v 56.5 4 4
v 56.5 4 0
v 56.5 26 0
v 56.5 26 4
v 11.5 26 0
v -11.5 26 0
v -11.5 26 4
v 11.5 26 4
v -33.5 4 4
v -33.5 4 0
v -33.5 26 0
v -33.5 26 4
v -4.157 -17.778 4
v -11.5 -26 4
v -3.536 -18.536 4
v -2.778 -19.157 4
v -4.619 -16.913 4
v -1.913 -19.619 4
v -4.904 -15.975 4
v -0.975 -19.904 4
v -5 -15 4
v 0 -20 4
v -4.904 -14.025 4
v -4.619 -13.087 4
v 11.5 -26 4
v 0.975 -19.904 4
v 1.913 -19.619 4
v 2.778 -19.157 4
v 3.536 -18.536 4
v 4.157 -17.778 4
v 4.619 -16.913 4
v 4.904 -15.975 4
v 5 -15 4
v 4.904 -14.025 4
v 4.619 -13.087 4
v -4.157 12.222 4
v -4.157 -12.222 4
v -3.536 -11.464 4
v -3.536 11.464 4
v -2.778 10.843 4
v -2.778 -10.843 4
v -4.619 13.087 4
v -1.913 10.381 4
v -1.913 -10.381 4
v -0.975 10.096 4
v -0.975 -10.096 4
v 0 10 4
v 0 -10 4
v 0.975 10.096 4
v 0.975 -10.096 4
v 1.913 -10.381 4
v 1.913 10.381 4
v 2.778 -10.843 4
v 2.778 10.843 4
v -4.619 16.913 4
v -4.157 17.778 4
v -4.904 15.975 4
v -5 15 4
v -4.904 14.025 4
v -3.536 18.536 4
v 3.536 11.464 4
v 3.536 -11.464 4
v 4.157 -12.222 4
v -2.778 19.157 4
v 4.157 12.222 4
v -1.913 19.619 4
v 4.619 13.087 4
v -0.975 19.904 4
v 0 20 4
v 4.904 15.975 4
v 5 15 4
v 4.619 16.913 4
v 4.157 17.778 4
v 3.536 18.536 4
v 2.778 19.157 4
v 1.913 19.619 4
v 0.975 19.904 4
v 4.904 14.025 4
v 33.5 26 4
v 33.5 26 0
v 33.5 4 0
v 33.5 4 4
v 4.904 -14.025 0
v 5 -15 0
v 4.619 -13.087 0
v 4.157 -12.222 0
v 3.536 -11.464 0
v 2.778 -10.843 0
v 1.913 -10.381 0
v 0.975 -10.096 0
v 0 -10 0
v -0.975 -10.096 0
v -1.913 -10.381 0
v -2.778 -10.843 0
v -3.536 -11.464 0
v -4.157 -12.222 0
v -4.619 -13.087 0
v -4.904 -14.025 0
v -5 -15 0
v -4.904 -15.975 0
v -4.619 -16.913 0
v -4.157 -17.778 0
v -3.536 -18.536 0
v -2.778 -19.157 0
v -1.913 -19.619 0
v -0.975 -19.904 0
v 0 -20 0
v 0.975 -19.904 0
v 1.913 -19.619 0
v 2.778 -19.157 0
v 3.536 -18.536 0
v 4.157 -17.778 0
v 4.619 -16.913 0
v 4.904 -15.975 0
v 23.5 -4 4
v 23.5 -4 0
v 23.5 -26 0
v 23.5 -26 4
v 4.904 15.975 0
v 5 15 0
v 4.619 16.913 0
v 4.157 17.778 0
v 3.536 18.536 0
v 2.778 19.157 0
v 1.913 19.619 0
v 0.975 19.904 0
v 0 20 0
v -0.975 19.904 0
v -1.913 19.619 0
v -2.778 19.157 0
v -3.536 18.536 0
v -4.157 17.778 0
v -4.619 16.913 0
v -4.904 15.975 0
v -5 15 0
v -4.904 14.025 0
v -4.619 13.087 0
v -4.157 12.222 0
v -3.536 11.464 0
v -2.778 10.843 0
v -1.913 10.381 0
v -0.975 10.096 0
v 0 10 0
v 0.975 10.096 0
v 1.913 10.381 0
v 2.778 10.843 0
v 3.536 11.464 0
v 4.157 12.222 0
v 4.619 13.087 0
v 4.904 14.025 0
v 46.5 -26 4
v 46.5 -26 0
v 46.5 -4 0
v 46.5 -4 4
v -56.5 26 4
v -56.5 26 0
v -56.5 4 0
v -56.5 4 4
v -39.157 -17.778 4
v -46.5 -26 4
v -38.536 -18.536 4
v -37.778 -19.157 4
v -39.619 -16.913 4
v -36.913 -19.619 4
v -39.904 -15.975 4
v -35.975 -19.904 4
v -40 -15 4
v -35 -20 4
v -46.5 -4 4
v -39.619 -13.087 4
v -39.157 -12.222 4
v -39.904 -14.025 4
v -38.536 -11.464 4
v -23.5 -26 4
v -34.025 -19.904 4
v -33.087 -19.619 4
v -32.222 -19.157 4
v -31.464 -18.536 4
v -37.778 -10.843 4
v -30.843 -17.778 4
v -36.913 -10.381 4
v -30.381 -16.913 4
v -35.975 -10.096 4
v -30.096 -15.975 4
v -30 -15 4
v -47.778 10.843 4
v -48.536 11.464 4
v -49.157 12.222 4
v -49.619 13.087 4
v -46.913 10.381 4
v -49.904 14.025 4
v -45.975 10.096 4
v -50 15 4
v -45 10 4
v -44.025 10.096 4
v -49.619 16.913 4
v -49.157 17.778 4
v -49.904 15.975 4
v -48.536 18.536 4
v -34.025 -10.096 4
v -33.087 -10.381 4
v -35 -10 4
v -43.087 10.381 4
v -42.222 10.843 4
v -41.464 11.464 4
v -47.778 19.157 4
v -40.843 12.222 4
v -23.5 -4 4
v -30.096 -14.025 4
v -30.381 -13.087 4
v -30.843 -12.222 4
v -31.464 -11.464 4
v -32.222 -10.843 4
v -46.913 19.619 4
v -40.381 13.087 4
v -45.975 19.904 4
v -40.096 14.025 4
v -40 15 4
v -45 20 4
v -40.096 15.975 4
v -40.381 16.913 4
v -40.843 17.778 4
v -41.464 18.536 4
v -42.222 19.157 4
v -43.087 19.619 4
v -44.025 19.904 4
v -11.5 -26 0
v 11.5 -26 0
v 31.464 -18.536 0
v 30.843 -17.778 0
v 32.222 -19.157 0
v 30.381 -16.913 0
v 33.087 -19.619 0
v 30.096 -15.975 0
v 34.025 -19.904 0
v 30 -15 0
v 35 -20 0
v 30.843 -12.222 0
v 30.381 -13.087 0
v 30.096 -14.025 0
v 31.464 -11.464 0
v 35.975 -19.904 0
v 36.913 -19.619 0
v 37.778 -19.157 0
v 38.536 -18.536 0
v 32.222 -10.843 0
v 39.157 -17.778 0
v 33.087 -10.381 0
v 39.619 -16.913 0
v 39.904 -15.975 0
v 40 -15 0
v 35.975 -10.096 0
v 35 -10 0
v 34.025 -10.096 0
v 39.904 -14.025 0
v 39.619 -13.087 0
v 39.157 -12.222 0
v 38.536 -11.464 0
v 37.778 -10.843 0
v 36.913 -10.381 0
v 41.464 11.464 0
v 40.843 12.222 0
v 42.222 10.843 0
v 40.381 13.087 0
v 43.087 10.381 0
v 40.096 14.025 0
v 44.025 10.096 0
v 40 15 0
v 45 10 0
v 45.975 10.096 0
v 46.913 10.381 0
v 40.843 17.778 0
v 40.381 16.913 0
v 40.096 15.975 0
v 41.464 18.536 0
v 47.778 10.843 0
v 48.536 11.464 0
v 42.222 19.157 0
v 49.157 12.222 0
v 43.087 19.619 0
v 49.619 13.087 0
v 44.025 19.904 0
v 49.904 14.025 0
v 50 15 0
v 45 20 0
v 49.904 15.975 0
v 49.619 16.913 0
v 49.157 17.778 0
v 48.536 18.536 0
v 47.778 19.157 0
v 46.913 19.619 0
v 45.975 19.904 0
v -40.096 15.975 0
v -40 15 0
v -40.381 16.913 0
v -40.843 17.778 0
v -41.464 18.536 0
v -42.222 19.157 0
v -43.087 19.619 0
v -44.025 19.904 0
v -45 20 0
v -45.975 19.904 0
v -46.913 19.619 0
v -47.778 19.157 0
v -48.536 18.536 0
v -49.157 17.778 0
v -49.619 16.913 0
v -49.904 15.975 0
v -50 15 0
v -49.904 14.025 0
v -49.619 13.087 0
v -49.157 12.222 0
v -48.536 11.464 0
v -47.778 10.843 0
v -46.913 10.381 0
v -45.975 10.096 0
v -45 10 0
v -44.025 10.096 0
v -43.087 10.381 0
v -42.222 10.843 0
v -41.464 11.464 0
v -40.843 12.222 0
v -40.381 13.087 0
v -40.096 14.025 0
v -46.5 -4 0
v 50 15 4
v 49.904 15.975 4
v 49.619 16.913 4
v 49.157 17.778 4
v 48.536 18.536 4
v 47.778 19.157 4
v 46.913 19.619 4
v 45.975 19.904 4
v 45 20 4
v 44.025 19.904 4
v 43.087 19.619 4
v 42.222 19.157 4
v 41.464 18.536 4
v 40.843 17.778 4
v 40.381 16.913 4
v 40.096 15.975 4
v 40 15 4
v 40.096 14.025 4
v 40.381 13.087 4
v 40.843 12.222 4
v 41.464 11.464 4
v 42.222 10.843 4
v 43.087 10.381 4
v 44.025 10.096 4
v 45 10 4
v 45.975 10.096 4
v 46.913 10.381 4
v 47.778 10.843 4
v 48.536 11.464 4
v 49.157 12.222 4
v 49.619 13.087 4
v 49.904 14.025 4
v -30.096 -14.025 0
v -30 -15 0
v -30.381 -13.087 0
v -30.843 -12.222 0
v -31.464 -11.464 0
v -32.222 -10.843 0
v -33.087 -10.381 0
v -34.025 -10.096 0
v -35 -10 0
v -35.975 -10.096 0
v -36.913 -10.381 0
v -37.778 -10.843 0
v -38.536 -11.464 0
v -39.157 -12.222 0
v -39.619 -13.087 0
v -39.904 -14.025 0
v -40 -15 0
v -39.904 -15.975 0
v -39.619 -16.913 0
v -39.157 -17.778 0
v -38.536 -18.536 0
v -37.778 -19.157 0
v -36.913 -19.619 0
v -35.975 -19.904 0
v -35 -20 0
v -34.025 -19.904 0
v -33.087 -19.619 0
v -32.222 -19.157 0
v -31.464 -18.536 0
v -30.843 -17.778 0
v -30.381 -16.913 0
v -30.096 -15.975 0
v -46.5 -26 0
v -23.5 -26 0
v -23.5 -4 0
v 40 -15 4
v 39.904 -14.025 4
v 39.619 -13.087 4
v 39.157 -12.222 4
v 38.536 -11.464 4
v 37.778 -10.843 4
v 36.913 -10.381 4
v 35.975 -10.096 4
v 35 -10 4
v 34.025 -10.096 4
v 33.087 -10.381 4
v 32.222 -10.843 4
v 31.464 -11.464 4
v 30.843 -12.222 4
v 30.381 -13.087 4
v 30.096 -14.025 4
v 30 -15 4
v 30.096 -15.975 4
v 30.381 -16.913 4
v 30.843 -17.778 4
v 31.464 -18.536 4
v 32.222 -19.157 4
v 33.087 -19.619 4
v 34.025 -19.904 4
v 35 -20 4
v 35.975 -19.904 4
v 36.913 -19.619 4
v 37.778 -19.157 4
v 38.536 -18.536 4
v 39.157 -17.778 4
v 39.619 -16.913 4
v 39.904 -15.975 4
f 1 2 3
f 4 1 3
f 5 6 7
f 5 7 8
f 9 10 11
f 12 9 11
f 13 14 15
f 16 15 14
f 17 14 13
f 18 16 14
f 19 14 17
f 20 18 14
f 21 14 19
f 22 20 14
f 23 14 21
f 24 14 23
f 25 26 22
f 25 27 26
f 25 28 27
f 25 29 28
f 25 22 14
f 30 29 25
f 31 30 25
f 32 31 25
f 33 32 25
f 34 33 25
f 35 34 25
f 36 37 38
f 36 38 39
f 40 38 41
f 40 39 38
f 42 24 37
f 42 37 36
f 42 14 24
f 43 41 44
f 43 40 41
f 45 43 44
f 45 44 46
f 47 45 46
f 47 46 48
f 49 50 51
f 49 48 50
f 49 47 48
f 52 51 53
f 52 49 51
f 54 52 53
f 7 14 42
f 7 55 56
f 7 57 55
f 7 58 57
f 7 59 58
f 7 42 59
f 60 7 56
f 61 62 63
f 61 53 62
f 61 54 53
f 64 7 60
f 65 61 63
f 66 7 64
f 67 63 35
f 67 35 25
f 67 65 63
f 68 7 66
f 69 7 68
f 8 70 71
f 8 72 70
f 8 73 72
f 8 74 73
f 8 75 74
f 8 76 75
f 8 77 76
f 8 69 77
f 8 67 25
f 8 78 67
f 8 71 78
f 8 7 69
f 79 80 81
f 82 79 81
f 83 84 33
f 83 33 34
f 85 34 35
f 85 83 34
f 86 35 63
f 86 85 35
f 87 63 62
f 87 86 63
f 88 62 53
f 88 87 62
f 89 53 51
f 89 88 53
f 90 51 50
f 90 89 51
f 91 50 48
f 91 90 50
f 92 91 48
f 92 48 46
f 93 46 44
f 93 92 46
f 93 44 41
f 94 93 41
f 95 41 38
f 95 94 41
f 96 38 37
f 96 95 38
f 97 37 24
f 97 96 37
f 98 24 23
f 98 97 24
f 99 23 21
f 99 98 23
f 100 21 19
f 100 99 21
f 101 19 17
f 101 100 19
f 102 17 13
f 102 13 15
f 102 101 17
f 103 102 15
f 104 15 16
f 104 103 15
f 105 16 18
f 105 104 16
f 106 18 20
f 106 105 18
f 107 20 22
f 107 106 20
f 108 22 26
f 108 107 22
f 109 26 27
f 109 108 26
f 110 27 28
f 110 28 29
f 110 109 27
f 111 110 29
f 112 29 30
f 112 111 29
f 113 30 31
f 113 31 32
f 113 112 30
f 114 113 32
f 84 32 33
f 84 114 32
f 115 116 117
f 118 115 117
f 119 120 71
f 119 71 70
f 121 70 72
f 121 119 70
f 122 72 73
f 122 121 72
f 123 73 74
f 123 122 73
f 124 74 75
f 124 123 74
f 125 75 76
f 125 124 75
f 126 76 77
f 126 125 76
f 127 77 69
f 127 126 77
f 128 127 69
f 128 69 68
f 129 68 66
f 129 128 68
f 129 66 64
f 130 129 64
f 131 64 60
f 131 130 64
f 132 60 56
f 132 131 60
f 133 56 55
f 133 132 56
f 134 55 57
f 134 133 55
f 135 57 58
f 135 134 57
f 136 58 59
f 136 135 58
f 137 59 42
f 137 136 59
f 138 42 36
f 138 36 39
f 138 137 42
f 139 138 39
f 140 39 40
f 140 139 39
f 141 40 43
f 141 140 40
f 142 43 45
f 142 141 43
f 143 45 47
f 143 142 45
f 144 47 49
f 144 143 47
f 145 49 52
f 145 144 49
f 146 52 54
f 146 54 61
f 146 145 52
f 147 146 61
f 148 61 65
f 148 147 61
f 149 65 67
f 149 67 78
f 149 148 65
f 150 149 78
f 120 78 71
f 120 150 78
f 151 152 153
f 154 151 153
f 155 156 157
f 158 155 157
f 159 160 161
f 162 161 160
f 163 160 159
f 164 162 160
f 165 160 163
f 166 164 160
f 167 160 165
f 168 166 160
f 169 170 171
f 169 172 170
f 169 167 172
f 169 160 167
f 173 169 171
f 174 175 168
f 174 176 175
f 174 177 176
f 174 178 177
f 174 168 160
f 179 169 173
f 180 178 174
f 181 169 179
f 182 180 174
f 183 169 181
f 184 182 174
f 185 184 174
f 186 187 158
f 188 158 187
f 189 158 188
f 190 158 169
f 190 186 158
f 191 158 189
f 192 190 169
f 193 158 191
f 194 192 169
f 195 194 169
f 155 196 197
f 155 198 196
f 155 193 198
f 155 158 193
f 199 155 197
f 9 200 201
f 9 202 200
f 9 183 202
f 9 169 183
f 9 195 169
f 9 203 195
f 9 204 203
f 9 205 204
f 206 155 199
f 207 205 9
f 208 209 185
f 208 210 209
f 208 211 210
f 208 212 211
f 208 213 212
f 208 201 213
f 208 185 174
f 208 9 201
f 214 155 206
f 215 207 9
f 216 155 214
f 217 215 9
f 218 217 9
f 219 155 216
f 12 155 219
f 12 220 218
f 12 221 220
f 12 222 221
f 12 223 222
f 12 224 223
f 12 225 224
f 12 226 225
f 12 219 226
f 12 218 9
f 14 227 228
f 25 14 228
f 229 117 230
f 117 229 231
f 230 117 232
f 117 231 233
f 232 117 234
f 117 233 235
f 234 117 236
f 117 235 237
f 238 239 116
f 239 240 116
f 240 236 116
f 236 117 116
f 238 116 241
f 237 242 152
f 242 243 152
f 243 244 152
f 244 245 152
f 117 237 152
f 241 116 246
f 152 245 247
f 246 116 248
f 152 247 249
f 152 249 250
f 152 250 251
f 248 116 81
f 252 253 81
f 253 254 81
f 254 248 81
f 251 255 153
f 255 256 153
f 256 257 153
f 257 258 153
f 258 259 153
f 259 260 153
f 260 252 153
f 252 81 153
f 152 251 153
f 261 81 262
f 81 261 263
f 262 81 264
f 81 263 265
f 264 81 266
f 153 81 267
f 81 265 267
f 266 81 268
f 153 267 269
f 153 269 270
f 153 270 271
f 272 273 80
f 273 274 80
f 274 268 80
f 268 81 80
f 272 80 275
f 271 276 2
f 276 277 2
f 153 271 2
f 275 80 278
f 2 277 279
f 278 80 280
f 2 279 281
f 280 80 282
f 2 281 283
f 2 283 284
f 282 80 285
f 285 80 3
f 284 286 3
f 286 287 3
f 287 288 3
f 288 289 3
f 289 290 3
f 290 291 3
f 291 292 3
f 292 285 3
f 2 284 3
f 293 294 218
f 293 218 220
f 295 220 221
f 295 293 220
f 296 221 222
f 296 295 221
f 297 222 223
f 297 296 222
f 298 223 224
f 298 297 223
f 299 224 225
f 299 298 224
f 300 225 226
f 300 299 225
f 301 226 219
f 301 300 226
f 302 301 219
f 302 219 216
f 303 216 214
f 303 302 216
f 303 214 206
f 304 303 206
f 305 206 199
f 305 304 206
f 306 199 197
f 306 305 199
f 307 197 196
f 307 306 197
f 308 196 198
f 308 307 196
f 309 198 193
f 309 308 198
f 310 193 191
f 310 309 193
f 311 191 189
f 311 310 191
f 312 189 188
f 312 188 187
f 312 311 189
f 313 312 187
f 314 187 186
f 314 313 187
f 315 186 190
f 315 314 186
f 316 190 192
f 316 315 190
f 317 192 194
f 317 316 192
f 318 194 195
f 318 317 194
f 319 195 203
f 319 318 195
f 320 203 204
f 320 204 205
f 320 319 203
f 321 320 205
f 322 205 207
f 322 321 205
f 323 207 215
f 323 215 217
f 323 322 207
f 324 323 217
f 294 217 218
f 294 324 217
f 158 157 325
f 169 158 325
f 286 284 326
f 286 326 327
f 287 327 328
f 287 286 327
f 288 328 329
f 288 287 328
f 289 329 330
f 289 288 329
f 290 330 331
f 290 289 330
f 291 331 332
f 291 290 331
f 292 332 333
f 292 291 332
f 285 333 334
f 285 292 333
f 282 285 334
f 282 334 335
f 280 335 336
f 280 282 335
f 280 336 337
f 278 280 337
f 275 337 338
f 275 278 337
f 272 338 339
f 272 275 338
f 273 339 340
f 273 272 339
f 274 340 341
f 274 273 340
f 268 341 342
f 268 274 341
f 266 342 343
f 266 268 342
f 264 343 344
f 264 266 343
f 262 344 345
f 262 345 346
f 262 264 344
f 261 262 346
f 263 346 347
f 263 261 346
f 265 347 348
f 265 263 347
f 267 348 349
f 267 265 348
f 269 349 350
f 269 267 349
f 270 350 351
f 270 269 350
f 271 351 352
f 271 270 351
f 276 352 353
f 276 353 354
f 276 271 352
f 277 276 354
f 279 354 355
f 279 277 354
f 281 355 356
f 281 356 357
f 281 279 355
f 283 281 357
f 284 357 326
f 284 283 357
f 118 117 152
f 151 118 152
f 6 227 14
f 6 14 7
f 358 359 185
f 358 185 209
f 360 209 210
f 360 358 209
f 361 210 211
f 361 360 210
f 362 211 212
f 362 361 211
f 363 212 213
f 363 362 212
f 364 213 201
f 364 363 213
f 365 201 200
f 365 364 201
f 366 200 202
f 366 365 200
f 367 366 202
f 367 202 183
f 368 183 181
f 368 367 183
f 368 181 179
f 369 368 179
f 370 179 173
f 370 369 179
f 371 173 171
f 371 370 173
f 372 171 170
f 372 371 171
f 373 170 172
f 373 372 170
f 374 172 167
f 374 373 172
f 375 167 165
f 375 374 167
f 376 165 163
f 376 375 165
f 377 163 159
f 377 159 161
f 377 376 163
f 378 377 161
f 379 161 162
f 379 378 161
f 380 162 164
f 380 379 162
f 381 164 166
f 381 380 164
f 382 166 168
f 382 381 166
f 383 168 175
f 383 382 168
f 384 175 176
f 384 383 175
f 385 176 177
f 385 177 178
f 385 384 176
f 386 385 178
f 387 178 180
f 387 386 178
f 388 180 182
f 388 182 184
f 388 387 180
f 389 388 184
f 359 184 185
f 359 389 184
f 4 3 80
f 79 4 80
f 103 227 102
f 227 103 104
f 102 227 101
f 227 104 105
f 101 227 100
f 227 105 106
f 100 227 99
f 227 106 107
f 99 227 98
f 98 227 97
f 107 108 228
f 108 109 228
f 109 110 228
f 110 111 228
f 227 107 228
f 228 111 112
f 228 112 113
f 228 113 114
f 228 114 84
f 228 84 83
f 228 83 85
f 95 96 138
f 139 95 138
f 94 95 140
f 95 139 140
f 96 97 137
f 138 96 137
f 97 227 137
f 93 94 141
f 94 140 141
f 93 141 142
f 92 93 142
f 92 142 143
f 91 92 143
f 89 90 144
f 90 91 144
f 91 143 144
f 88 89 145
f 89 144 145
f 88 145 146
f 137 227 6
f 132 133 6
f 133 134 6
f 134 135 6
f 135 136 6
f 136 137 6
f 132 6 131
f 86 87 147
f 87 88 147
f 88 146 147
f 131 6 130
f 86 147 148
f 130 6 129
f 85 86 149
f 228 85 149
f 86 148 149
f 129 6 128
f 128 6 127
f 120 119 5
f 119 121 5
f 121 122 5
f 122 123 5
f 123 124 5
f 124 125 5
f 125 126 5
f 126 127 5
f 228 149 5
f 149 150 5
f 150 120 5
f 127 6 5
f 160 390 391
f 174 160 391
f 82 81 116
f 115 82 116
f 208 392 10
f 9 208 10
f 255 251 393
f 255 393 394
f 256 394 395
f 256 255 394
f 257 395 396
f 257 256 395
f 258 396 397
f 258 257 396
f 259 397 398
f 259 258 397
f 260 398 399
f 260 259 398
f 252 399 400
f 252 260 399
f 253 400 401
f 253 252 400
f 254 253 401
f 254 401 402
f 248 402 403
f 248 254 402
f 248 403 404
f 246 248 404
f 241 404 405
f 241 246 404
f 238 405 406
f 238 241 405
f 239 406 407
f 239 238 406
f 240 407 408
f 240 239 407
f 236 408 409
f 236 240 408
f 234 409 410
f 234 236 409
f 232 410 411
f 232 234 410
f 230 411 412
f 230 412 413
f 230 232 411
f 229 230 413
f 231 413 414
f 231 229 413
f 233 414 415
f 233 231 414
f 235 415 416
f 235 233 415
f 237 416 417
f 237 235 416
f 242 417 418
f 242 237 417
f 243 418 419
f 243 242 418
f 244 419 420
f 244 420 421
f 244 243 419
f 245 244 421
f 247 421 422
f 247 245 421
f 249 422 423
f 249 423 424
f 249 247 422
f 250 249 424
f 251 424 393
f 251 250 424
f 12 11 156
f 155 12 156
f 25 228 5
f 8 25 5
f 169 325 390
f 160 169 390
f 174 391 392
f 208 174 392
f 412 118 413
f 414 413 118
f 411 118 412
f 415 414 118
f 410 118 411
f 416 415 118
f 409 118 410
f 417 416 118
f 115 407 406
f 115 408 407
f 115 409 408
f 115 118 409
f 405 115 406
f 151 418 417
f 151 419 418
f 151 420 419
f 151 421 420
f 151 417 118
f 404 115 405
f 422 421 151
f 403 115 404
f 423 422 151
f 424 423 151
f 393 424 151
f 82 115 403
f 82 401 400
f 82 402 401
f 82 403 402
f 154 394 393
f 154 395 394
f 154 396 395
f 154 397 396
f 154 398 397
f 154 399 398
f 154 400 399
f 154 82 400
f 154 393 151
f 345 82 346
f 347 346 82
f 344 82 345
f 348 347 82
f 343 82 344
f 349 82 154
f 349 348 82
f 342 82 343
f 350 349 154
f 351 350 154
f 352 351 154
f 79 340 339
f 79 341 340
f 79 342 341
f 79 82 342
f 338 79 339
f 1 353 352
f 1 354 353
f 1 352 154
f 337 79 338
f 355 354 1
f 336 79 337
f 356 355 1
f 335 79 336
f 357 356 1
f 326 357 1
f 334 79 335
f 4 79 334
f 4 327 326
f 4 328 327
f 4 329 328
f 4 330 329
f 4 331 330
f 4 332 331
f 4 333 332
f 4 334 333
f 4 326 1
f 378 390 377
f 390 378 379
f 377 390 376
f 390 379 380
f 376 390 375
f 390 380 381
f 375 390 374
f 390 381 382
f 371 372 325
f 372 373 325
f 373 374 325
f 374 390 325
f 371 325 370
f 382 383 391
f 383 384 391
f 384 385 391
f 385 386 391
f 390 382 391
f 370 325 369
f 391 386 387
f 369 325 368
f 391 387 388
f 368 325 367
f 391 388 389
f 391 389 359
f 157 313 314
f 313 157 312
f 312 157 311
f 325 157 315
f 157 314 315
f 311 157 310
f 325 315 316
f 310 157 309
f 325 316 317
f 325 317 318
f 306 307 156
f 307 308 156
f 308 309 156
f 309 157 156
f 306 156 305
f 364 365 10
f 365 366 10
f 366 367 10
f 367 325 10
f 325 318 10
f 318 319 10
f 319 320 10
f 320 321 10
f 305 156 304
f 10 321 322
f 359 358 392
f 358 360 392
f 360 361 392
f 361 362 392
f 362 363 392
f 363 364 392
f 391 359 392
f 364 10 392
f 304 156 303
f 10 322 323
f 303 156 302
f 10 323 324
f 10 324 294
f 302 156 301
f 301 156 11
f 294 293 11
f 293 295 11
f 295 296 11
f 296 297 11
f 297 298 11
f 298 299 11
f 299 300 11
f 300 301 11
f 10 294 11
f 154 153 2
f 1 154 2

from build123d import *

# Parameters (mm, degrees)
F0_R     = 5
F1_DEPTH = 4
F0_W     = 23
F0_H     = 52


# Not quite as in the source:
# - a feature names something its author has since deleted; it is built from what else it names


with BuildPart() as f1:
    # F0 (on Top) → F1 (new body)
    with BuildSketch(Plane.XY):
        Polygon((-46.5, -26), (-23.5, -26), (-23.5, -4), (-33.5, 4), (-33.5, 26), (-56.5, 26), (-56.5, 4), (-46.5, -4), align=None)
        with Locations((-35, -15)):
            Circle(F0_R, mode=Mode.SUBTRACT)
        with Locations((-45, 15)):
            Circle(F0_R, mode=Mode.SUBTRACT)
    extrude(amount=F1_DEPTH)


with BuildPart() as f1b:
    # F0 (on Top) → F1, piece 2 (new body)
    with BuildSketch(Plane.XY):
        Rectangle(F0_W, F0_H)
        with Locations((0, -15)):
            Circle(F0_R, mode=Mode.SUBTRACT)
        with Locations((0, 15)):
            Circle(F0_R, mode=Mode.SUBTRACT)
    extrude(amount=F1_DEPTH)


with BuildPart() as f1c:
    # F0 (on Top) → F1, piece 3 (new body)
    with BuildSketch(Plane.XY):
        Polygon((56.5, 4), (56.5, 26), (33.5, 26), (33.5, 4), (23.5, -4), (23.5, -26), (46.5, -26), (46.5, -4), align=None)
        with Locations((35, -15)):
            Circle(F0_R, mode=Mode.SUBTRACT)
        with Locations((45, 15)):
            Circle(F0_R, mode=Mode.SUBTRACT)
    extrude(amount=F1_DEPTH)


solid = Compound([f1.part, f1b.part, f1c.part])
